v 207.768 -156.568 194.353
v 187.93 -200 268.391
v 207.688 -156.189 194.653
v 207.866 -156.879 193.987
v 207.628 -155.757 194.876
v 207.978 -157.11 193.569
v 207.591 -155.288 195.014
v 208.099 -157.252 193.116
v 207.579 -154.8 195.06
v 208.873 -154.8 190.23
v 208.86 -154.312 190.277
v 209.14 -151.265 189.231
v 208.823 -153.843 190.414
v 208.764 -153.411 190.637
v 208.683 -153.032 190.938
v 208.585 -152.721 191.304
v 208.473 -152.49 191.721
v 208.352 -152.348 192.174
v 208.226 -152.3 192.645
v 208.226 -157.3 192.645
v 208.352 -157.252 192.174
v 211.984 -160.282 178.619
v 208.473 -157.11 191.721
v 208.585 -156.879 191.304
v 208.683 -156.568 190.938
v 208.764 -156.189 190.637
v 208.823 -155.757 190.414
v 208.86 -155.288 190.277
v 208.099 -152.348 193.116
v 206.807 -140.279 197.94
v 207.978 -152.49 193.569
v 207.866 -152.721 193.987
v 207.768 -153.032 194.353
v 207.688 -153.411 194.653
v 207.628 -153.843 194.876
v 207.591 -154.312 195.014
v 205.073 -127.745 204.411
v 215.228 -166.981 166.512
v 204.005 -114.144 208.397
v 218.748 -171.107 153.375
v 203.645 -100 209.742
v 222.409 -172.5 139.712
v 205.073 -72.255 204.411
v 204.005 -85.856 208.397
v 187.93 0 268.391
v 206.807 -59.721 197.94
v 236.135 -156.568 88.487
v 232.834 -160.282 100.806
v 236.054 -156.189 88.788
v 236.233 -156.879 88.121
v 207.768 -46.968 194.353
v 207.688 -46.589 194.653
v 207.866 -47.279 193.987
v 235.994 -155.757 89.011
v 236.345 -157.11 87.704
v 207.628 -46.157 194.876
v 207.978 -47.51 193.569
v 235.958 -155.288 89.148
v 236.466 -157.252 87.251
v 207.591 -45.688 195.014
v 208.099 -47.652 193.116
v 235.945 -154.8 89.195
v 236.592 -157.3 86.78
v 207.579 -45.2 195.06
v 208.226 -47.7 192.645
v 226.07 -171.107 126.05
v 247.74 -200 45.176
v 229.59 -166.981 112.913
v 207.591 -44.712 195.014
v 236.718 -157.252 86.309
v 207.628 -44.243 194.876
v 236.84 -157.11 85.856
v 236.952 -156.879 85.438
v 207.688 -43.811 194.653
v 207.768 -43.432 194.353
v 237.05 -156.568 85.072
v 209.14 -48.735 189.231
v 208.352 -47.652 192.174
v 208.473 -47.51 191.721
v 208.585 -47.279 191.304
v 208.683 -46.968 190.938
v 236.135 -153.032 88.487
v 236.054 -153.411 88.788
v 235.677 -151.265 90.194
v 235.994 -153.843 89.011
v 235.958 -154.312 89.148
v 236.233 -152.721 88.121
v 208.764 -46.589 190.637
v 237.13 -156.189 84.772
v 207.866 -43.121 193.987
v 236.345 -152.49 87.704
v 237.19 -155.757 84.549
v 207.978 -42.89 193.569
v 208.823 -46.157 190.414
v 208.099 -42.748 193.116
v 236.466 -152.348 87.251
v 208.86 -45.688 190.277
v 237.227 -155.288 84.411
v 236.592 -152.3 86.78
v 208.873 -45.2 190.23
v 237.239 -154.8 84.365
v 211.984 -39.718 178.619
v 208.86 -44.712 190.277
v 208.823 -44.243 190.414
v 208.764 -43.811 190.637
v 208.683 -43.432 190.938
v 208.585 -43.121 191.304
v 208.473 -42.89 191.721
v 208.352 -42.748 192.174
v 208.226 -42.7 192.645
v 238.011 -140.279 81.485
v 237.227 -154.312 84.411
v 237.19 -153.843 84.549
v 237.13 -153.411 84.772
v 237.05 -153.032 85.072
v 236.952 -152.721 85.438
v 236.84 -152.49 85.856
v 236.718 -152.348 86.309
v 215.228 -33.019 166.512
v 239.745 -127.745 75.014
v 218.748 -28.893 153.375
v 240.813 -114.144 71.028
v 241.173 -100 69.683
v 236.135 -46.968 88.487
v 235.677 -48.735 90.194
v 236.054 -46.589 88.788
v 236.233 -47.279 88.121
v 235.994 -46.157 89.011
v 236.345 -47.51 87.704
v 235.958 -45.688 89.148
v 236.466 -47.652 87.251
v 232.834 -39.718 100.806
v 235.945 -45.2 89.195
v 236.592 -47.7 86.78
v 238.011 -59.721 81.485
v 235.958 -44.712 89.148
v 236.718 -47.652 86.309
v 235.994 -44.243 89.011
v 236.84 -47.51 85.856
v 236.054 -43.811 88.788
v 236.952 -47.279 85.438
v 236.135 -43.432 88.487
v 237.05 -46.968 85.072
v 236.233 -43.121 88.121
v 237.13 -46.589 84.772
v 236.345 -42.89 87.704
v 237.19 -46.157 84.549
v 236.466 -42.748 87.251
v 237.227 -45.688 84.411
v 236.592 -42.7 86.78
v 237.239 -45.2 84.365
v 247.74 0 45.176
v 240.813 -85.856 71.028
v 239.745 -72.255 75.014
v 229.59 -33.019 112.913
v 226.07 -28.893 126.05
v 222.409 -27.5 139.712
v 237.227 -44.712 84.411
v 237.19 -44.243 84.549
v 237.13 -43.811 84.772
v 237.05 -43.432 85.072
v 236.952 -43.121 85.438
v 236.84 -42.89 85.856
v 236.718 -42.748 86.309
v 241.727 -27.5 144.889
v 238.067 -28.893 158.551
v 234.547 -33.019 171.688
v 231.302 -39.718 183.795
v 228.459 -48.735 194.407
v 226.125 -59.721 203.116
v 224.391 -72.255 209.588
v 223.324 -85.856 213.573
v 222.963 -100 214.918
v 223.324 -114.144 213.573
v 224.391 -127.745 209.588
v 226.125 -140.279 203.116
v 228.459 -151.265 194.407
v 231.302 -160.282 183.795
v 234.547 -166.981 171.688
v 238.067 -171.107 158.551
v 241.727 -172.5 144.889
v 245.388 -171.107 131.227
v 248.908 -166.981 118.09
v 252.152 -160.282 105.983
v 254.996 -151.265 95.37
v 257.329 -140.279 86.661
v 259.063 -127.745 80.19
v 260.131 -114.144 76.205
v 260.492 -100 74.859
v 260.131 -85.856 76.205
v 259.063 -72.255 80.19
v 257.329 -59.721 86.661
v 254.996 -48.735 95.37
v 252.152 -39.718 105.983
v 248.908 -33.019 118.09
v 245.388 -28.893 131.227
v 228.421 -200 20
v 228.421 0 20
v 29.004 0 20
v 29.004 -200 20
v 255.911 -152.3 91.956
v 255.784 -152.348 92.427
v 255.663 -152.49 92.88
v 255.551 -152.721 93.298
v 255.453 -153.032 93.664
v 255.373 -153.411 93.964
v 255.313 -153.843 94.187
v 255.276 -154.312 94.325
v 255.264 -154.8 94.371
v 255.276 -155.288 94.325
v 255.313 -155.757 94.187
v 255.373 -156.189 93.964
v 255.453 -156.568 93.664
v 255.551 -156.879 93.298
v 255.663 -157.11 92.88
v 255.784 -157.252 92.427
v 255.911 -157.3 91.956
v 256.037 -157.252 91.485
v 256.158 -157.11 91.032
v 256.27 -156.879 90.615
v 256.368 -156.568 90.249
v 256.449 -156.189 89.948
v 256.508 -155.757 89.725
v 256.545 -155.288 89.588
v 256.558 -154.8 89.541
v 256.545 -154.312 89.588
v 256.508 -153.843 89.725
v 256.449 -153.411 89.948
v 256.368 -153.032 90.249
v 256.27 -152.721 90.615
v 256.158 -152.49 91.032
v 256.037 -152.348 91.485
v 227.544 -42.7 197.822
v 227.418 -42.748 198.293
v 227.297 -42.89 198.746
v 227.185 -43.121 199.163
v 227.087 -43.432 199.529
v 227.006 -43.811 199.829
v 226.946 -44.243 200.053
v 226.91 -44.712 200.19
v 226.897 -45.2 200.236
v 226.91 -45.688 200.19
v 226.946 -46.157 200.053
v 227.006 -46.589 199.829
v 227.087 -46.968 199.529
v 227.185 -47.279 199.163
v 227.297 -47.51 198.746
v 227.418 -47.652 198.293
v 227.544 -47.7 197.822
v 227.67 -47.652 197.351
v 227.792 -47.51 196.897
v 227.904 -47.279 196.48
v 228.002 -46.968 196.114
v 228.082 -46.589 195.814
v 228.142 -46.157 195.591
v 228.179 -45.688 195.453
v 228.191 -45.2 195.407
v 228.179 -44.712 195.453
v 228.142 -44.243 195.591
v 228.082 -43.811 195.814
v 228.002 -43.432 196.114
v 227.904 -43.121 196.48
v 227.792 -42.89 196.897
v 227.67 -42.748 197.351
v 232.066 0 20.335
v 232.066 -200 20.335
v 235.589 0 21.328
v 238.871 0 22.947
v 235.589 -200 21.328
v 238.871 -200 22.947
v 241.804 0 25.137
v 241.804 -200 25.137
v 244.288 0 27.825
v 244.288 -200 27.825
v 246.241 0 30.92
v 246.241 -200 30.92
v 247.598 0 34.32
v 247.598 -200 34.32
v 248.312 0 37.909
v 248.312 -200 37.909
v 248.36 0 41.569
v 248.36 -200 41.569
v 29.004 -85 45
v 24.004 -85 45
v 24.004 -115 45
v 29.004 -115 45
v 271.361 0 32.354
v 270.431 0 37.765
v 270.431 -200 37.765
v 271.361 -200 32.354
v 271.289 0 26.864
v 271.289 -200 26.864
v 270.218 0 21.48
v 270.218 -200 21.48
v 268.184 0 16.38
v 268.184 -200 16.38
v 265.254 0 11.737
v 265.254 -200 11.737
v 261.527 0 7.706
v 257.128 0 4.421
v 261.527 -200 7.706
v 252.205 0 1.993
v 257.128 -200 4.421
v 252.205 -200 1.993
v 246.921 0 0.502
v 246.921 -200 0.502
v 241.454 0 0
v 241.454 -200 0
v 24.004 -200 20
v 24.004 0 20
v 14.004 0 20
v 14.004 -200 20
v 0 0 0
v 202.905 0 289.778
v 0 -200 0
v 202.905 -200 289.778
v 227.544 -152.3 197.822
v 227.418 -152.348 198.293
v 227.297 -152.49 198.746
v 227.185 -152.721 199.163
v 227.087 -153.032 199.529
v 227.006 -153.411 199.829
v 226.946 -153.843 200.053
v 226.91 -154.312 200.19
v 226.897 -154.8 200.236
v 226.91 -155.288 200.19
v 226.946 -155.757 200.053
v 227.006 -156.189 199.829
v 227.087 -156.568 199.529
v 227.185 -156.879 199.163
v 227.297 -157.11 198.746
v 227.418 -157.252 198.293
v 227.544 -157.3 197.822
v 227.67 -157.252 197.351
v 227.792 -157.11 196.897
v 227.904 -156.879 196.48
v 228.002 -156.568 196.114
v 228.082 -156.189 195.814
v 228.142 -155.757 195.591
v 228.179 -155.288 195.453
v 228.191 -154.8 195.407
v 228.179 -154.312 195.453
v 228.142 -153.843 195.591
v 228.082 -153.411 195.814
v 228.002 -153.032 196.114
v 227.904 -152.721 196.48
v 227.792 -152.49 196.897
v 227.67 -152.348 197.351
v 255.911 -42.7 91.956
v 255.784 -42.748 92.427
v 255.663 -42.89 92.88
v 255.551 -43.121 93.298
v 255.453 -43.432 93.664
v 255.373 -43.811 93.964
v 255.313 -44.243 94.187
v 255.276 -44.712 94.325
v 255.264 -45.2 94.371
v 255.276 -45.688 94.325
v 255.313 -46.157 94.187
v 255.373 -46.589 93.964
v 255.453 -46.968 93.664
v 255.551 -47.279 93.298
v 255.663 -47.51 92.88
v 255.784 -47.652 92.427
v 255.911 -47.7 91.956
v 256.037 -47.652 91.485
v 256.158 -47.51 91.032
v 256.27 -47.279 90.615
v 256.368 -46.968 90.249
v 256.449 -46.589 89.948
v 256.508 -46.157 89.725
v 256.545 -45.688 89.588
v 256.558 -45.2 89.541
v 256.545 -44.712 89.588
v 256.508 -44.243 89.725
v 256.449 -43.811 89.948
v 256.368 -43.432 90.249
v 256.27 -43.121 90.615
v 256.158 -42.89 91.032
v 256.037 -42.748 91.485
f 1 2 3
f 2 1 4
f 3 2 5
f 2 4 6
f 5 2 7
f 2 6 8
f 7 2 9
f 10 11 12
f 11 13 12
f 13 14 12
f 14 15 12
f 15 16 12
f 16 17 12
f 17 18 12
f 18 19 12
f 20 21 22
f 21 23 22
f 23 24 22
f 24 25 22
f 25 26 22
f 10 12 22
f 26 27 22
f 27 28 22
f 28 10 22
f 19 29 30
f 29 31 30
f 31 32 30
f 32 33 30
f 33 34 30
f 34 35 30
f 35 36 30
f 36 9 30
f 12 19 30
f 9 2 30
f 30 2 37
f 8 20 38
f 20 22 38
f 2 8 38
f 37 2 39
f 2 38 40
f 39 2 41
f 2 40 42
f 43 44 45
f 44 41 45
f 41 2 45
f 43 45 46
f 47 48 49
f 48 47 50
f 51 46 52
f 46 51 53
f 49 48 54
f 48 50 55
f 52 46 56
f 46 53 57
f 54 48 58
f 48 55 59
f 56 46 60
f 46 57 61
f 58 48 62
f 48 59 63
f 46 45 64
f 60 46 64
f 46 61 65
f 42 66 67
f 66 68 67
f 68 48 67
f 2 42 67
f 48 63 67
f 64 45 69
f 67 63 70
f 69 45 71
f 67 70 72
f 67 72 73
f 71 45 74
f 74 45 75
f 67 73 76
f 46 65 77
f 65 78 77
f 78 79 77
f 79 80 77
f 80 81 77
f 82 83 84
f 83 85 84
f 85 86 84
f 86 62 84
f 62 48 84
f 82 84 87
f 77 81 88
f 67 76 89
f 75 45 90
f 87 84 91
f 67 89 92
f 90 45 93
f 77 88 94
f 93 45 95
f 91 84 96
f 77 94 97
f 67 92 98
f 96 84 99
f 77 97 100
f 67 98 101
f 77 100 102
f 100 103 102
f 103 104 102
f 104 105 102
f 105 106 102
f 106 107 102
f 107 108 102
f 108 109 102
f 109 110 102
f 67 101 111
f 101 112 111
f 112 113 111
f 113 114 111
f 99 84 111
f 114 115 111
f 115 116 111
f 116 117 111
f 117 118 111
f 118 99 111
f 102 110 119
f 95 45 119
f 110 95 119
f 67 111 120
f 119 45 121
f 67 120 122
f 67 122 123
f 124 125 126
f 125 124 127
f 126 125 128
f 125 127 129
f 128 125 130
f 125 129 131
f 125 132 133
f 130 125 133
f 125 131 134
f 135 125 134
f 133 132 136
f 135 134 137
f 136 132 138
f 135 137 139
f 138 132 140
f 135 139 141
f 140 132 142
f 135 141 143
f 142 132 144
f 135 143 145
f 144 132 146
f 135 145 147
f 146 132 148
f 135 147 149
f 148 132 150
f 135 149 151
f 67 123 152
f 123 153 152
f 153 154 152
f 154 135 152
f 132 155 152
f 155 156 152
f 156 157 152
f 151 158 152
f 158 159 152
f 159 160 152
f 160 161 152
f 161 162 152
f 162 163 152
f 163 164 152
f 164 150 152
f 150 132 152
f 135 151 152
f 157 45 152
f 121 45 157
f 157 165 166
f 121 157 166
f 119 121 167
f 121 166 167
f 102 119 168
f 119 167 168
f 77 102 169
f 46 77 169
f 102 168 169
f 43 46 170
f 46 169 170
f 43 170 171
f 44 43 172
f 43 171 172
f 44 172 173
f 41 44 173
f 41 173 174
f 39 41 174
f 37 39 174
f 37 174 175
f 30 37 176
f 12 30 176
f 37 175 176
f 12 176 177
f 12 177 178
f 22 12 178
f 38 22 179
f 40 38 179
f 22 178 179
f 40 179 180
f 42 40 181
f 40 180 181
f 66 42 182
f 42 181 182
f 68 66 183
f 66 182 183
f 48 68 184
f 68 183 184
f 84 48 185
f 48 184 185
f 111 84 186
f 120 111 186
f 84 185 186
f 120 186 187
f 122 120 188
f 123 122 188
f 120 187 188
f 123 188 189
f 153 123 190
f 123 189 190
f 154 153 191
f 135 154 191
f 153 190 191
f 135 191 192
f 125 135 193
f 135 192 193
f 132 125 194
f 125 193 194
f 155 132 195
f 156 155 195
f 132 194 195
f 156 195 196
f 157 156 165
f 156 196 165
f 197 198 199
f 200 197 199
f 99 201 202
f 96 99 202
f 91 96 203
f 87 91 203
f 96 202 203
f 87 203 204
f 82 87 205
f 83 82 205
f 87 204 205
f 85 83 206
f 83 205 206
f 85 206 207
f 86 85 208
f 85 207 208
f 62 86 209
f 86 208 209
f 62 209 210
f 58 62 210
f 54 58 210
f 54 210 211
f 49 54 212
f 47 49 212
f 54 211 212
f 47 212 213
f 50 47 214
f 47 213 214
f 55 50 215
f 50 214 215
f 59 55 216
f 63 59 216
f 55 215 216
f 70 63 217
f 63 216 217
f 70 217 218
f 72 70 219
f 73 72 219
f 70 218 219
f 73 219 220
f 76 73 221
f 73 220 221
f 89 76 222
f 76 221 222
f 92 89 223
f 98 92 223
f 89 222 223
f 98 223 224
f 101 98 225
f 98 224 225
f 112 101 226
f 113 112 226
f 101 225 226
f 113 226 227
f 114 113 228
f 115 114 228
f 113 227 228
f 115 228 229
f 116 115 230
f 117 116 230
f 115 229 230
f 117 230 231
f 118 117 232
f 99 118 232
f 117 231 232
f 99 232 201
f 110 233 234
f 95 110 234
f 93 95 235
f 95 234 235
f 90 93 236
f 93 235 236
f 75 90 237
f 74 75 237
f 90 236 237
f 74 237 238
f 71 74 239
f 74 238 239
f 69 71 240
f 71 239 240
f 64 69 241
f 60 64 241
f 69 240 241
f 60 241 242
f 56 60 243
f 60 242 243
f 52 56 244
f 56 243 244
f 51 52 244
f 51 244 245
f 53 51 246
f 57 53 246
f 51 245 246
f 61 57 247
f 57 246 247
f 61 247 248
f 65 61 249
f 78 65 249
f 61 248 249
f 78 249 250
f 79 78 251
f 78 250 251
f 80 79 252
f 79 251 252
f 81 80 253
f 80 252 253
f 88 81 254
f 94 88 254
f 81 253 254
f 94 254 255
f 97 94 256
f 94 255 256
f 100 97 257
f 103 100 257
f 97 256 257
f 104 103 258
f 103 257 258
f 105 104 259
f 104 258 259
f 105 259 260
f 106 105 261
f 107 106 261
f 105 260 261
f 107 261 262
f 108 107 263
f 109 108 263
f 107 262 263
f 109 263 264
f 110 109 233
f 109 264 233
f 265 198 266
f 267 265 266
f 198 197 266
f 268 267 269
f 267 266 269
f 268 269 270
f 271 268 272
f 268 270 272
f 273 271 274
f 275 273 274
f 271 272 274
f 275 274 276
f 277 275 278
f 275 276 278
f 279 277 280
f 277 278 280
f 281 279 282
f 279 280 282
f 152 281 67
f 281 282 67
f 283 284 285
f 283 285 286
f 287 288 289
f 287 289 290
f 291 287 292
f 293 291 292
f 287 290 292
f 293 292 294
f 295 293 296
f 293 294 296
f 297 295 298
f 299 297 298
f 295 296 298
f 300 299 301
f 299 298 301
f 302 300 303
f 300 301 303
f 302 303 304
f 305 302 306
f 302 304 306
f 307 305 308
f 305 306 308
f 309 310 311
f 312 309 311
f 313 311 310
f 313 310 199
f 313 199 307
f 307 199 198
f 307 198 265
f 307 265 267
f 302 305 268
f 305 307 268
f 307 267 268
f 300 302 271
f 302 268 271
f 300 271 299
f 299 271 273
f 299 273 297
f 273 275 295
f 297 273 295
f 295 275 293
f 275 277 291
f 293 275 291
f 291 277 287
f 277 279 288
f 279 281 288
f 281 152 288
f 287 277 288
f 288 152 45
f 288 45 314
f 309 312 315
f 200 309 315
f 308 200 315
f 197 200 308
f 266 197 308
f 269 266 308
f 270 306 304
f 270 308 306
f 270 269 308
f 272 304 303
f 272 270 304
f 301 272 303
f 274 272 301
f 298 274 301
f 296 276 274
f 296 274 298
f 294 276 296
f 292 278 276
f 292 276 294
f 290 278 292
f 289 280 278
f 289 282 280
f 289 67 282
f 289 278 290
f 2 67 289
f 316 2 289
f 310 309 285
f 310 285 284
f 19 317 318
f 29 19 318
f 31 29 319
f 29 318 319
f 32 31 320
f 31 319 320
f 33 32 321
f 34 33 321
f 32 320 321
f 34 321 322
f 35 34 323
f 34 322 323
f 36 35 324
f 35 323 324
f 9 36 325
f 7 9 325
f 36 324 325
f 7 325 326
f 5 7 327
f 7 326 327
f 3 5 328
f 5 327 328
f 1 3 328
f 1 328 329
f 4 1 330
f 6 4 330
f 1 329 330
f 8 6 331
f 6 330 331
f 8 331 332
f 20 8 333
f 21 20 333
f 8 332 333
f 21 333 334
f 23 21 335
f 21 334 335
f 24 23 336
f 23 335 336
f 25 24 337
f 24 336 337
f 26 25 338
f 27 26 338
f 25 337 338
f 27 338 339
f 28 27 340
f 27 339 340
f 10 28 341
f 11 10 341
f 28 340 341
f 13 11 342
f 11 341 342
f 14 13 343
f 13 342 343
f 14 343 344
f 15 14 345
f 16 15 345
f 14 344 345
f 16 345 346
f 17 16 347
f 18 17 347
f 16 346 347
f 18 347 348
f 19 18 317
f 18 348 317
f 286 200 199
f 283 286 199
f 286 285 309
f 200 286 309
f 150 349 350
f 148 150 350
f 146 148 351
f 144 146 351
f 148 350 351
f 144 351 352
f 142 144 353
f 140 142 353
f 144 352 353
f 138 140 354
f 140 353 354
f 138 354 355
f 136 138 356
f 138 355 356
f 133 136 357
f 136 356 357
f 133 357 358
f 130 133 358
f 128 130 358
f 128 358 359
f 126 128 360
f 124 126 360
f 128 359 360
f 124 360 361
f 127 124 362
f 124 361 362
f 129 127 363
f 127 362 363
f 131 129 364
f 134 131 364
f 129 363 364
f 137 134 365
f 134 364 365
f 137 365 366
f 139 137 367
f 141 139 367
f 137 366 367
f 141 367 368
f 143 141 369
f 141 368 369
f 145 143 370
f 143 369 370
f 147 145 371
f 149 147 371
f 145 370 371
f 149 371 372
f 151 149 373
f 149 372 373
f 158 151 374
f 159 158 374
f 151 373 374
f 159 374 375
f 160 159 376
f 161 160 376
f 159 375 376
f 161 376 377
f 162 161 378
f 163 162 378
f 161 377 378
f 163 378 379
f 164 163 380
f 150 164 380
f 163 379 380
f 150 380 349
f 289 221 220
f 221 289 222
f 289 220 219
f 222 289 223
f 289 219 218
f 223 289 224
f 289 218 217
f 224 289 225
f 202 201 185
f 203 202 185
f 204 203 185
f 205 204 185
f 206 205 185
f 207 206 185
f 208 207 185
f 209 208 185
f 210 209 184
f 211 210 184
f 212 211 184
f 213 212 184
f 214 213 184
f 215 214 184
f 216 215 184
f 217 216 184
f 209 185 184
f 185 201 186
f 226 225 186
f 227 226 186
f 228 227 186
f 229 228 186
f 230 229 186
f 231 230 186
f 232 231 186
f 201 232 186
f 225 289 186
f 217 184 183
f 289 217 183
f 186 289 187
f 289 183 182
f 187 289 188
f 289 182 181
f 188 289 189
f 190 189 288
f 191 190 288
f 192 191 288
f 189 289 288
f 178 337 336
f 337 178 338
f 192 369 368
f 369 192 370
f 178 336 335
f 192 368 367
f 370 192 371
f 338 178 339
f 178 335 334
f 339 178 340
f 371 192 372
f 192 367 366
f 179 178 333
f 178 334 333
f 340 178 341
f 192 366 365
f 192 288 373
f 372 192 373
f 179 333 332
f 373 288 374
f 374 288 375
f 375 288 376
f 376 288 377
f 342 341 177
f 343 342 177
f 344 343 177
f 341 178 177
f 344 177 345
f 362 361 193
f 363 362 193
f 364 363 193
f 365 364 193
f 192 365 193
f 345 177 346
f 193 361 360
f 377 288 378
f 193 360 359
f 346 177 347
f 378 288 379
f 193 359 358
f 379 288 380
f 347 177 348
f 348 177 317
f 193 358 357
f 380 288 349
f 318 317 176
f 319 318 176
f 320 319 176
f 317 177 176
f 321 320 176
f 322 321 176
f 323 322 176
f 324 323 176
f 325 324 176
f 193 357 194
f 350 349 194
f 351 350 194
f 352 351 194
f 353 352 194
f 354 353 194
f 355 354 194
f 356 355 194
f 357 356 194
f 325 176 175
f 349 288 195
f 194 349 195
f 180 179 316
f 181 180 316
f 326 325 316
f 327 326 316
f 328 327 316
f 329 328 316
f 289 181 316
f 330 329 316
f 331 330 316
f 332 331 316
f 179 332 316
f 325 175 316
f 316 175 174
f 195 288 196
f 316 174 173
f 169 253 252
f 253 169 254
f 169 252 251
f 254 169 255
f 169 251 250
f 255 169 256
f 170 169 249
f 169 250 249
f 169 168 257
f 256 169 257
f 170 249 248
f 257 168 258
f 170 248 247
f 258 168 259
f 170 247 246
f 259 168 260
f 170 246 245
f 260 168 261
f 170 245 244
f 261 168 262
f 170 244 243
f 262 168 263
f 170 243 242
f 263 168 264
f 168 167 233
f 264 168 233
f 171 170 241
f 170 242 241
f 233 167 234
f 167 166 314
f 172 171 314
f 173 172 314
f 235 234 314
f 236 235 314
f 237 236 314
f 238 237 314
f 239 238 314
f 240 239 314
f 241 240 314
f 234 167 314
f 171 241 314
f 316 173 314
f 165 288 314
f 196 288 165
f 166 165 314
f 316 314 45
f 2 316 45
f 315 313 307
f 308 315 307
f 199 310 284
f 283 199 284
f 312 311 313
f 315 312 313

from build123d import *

# Parameters (mm, degrees)
F1_DEPTH = 200
F2_R     = 72.5
F2_R_2   = 2.5
F3_DEPTH = 20
F4_R     = 20
F5_R     = 30
F6_W     = 5
F6_H     = 200
F7_DEPTH = 25
F9_DEPTH = 25


with BuildPart() as f1:
    # F0 (on Front) → F1 (new body)
    with BuildSketch(Plane.XZ):
        Polygon((14.0041507642, 20), (0, 0), (280.5502770065, 0), (202.9045634757, 289.7777478867), (187.9295462557, 268.391206893), (254.4857695496, 20), align=None)
    extrude(amount=F1_DEPTH)

    # F2 (on face) → F3 (cut, through all)
    with BuildSketch(Plane(origin=(261.7569719664, 0, 70.1375692516), x_dir=(0, 1, 0), z_dir=(0.9659258263, 0, 0.2588190451))):
        with Locations((-100, 77.3882452019)):
            Circle(F2_R)
        with Locations((-154.8, 132.1882452019)):
            Circle(F2_R_2)
        with Locations((-45.2, 132.1882452019)):
            Circle(F2_R_2)
        with Locations((-45.2, 22.5882452019)):
            Circle(F2_R_2)
        with Locations((-154.8, 22.5882452019)):
            Circle(F2_R_2)
    extrude(amount=-F3_DEPTH, mode=Mode.SUBTRACT)

    # F4
    f4_edges = [f1.edges().sort_by_distance(p)[0] for p in [
        (254.48577, -100, 20),
    ]]
    fillet(f4_edges, radius=F4_R)

    # F5
    f5_edges = [f1.edges().sort_by_distance(p)[0] for p in [
        (280.550277, -100, 0),
    ]]
    fillet(f5_edges, radius=F5_R)

    # F6 (on face) → F7 (join)
    with BuildSketch(Plane.XY.offset(20)):
        with Locations((26.5041507642, -100)):
            Rectangle(F6_W, F6_H)
    extrude(amount=F7_DEPTH)

    # F8 (on face) → F9 (cut)
    with BuildSketch(Plane(origin=(24.0041507642, 0, 0), x_dir=(0, -1, 0), z_dir=(-1, 0, 0))):
        Polygon((0, 20), (85, 45), (0, 45), align=None)
        Polygon((200, 45), (115, 45), (200, 20), align=None)
    extrude(amount=-F9_DEPTH, mode=Mode.SUBTRACT)


solid = f1.part
